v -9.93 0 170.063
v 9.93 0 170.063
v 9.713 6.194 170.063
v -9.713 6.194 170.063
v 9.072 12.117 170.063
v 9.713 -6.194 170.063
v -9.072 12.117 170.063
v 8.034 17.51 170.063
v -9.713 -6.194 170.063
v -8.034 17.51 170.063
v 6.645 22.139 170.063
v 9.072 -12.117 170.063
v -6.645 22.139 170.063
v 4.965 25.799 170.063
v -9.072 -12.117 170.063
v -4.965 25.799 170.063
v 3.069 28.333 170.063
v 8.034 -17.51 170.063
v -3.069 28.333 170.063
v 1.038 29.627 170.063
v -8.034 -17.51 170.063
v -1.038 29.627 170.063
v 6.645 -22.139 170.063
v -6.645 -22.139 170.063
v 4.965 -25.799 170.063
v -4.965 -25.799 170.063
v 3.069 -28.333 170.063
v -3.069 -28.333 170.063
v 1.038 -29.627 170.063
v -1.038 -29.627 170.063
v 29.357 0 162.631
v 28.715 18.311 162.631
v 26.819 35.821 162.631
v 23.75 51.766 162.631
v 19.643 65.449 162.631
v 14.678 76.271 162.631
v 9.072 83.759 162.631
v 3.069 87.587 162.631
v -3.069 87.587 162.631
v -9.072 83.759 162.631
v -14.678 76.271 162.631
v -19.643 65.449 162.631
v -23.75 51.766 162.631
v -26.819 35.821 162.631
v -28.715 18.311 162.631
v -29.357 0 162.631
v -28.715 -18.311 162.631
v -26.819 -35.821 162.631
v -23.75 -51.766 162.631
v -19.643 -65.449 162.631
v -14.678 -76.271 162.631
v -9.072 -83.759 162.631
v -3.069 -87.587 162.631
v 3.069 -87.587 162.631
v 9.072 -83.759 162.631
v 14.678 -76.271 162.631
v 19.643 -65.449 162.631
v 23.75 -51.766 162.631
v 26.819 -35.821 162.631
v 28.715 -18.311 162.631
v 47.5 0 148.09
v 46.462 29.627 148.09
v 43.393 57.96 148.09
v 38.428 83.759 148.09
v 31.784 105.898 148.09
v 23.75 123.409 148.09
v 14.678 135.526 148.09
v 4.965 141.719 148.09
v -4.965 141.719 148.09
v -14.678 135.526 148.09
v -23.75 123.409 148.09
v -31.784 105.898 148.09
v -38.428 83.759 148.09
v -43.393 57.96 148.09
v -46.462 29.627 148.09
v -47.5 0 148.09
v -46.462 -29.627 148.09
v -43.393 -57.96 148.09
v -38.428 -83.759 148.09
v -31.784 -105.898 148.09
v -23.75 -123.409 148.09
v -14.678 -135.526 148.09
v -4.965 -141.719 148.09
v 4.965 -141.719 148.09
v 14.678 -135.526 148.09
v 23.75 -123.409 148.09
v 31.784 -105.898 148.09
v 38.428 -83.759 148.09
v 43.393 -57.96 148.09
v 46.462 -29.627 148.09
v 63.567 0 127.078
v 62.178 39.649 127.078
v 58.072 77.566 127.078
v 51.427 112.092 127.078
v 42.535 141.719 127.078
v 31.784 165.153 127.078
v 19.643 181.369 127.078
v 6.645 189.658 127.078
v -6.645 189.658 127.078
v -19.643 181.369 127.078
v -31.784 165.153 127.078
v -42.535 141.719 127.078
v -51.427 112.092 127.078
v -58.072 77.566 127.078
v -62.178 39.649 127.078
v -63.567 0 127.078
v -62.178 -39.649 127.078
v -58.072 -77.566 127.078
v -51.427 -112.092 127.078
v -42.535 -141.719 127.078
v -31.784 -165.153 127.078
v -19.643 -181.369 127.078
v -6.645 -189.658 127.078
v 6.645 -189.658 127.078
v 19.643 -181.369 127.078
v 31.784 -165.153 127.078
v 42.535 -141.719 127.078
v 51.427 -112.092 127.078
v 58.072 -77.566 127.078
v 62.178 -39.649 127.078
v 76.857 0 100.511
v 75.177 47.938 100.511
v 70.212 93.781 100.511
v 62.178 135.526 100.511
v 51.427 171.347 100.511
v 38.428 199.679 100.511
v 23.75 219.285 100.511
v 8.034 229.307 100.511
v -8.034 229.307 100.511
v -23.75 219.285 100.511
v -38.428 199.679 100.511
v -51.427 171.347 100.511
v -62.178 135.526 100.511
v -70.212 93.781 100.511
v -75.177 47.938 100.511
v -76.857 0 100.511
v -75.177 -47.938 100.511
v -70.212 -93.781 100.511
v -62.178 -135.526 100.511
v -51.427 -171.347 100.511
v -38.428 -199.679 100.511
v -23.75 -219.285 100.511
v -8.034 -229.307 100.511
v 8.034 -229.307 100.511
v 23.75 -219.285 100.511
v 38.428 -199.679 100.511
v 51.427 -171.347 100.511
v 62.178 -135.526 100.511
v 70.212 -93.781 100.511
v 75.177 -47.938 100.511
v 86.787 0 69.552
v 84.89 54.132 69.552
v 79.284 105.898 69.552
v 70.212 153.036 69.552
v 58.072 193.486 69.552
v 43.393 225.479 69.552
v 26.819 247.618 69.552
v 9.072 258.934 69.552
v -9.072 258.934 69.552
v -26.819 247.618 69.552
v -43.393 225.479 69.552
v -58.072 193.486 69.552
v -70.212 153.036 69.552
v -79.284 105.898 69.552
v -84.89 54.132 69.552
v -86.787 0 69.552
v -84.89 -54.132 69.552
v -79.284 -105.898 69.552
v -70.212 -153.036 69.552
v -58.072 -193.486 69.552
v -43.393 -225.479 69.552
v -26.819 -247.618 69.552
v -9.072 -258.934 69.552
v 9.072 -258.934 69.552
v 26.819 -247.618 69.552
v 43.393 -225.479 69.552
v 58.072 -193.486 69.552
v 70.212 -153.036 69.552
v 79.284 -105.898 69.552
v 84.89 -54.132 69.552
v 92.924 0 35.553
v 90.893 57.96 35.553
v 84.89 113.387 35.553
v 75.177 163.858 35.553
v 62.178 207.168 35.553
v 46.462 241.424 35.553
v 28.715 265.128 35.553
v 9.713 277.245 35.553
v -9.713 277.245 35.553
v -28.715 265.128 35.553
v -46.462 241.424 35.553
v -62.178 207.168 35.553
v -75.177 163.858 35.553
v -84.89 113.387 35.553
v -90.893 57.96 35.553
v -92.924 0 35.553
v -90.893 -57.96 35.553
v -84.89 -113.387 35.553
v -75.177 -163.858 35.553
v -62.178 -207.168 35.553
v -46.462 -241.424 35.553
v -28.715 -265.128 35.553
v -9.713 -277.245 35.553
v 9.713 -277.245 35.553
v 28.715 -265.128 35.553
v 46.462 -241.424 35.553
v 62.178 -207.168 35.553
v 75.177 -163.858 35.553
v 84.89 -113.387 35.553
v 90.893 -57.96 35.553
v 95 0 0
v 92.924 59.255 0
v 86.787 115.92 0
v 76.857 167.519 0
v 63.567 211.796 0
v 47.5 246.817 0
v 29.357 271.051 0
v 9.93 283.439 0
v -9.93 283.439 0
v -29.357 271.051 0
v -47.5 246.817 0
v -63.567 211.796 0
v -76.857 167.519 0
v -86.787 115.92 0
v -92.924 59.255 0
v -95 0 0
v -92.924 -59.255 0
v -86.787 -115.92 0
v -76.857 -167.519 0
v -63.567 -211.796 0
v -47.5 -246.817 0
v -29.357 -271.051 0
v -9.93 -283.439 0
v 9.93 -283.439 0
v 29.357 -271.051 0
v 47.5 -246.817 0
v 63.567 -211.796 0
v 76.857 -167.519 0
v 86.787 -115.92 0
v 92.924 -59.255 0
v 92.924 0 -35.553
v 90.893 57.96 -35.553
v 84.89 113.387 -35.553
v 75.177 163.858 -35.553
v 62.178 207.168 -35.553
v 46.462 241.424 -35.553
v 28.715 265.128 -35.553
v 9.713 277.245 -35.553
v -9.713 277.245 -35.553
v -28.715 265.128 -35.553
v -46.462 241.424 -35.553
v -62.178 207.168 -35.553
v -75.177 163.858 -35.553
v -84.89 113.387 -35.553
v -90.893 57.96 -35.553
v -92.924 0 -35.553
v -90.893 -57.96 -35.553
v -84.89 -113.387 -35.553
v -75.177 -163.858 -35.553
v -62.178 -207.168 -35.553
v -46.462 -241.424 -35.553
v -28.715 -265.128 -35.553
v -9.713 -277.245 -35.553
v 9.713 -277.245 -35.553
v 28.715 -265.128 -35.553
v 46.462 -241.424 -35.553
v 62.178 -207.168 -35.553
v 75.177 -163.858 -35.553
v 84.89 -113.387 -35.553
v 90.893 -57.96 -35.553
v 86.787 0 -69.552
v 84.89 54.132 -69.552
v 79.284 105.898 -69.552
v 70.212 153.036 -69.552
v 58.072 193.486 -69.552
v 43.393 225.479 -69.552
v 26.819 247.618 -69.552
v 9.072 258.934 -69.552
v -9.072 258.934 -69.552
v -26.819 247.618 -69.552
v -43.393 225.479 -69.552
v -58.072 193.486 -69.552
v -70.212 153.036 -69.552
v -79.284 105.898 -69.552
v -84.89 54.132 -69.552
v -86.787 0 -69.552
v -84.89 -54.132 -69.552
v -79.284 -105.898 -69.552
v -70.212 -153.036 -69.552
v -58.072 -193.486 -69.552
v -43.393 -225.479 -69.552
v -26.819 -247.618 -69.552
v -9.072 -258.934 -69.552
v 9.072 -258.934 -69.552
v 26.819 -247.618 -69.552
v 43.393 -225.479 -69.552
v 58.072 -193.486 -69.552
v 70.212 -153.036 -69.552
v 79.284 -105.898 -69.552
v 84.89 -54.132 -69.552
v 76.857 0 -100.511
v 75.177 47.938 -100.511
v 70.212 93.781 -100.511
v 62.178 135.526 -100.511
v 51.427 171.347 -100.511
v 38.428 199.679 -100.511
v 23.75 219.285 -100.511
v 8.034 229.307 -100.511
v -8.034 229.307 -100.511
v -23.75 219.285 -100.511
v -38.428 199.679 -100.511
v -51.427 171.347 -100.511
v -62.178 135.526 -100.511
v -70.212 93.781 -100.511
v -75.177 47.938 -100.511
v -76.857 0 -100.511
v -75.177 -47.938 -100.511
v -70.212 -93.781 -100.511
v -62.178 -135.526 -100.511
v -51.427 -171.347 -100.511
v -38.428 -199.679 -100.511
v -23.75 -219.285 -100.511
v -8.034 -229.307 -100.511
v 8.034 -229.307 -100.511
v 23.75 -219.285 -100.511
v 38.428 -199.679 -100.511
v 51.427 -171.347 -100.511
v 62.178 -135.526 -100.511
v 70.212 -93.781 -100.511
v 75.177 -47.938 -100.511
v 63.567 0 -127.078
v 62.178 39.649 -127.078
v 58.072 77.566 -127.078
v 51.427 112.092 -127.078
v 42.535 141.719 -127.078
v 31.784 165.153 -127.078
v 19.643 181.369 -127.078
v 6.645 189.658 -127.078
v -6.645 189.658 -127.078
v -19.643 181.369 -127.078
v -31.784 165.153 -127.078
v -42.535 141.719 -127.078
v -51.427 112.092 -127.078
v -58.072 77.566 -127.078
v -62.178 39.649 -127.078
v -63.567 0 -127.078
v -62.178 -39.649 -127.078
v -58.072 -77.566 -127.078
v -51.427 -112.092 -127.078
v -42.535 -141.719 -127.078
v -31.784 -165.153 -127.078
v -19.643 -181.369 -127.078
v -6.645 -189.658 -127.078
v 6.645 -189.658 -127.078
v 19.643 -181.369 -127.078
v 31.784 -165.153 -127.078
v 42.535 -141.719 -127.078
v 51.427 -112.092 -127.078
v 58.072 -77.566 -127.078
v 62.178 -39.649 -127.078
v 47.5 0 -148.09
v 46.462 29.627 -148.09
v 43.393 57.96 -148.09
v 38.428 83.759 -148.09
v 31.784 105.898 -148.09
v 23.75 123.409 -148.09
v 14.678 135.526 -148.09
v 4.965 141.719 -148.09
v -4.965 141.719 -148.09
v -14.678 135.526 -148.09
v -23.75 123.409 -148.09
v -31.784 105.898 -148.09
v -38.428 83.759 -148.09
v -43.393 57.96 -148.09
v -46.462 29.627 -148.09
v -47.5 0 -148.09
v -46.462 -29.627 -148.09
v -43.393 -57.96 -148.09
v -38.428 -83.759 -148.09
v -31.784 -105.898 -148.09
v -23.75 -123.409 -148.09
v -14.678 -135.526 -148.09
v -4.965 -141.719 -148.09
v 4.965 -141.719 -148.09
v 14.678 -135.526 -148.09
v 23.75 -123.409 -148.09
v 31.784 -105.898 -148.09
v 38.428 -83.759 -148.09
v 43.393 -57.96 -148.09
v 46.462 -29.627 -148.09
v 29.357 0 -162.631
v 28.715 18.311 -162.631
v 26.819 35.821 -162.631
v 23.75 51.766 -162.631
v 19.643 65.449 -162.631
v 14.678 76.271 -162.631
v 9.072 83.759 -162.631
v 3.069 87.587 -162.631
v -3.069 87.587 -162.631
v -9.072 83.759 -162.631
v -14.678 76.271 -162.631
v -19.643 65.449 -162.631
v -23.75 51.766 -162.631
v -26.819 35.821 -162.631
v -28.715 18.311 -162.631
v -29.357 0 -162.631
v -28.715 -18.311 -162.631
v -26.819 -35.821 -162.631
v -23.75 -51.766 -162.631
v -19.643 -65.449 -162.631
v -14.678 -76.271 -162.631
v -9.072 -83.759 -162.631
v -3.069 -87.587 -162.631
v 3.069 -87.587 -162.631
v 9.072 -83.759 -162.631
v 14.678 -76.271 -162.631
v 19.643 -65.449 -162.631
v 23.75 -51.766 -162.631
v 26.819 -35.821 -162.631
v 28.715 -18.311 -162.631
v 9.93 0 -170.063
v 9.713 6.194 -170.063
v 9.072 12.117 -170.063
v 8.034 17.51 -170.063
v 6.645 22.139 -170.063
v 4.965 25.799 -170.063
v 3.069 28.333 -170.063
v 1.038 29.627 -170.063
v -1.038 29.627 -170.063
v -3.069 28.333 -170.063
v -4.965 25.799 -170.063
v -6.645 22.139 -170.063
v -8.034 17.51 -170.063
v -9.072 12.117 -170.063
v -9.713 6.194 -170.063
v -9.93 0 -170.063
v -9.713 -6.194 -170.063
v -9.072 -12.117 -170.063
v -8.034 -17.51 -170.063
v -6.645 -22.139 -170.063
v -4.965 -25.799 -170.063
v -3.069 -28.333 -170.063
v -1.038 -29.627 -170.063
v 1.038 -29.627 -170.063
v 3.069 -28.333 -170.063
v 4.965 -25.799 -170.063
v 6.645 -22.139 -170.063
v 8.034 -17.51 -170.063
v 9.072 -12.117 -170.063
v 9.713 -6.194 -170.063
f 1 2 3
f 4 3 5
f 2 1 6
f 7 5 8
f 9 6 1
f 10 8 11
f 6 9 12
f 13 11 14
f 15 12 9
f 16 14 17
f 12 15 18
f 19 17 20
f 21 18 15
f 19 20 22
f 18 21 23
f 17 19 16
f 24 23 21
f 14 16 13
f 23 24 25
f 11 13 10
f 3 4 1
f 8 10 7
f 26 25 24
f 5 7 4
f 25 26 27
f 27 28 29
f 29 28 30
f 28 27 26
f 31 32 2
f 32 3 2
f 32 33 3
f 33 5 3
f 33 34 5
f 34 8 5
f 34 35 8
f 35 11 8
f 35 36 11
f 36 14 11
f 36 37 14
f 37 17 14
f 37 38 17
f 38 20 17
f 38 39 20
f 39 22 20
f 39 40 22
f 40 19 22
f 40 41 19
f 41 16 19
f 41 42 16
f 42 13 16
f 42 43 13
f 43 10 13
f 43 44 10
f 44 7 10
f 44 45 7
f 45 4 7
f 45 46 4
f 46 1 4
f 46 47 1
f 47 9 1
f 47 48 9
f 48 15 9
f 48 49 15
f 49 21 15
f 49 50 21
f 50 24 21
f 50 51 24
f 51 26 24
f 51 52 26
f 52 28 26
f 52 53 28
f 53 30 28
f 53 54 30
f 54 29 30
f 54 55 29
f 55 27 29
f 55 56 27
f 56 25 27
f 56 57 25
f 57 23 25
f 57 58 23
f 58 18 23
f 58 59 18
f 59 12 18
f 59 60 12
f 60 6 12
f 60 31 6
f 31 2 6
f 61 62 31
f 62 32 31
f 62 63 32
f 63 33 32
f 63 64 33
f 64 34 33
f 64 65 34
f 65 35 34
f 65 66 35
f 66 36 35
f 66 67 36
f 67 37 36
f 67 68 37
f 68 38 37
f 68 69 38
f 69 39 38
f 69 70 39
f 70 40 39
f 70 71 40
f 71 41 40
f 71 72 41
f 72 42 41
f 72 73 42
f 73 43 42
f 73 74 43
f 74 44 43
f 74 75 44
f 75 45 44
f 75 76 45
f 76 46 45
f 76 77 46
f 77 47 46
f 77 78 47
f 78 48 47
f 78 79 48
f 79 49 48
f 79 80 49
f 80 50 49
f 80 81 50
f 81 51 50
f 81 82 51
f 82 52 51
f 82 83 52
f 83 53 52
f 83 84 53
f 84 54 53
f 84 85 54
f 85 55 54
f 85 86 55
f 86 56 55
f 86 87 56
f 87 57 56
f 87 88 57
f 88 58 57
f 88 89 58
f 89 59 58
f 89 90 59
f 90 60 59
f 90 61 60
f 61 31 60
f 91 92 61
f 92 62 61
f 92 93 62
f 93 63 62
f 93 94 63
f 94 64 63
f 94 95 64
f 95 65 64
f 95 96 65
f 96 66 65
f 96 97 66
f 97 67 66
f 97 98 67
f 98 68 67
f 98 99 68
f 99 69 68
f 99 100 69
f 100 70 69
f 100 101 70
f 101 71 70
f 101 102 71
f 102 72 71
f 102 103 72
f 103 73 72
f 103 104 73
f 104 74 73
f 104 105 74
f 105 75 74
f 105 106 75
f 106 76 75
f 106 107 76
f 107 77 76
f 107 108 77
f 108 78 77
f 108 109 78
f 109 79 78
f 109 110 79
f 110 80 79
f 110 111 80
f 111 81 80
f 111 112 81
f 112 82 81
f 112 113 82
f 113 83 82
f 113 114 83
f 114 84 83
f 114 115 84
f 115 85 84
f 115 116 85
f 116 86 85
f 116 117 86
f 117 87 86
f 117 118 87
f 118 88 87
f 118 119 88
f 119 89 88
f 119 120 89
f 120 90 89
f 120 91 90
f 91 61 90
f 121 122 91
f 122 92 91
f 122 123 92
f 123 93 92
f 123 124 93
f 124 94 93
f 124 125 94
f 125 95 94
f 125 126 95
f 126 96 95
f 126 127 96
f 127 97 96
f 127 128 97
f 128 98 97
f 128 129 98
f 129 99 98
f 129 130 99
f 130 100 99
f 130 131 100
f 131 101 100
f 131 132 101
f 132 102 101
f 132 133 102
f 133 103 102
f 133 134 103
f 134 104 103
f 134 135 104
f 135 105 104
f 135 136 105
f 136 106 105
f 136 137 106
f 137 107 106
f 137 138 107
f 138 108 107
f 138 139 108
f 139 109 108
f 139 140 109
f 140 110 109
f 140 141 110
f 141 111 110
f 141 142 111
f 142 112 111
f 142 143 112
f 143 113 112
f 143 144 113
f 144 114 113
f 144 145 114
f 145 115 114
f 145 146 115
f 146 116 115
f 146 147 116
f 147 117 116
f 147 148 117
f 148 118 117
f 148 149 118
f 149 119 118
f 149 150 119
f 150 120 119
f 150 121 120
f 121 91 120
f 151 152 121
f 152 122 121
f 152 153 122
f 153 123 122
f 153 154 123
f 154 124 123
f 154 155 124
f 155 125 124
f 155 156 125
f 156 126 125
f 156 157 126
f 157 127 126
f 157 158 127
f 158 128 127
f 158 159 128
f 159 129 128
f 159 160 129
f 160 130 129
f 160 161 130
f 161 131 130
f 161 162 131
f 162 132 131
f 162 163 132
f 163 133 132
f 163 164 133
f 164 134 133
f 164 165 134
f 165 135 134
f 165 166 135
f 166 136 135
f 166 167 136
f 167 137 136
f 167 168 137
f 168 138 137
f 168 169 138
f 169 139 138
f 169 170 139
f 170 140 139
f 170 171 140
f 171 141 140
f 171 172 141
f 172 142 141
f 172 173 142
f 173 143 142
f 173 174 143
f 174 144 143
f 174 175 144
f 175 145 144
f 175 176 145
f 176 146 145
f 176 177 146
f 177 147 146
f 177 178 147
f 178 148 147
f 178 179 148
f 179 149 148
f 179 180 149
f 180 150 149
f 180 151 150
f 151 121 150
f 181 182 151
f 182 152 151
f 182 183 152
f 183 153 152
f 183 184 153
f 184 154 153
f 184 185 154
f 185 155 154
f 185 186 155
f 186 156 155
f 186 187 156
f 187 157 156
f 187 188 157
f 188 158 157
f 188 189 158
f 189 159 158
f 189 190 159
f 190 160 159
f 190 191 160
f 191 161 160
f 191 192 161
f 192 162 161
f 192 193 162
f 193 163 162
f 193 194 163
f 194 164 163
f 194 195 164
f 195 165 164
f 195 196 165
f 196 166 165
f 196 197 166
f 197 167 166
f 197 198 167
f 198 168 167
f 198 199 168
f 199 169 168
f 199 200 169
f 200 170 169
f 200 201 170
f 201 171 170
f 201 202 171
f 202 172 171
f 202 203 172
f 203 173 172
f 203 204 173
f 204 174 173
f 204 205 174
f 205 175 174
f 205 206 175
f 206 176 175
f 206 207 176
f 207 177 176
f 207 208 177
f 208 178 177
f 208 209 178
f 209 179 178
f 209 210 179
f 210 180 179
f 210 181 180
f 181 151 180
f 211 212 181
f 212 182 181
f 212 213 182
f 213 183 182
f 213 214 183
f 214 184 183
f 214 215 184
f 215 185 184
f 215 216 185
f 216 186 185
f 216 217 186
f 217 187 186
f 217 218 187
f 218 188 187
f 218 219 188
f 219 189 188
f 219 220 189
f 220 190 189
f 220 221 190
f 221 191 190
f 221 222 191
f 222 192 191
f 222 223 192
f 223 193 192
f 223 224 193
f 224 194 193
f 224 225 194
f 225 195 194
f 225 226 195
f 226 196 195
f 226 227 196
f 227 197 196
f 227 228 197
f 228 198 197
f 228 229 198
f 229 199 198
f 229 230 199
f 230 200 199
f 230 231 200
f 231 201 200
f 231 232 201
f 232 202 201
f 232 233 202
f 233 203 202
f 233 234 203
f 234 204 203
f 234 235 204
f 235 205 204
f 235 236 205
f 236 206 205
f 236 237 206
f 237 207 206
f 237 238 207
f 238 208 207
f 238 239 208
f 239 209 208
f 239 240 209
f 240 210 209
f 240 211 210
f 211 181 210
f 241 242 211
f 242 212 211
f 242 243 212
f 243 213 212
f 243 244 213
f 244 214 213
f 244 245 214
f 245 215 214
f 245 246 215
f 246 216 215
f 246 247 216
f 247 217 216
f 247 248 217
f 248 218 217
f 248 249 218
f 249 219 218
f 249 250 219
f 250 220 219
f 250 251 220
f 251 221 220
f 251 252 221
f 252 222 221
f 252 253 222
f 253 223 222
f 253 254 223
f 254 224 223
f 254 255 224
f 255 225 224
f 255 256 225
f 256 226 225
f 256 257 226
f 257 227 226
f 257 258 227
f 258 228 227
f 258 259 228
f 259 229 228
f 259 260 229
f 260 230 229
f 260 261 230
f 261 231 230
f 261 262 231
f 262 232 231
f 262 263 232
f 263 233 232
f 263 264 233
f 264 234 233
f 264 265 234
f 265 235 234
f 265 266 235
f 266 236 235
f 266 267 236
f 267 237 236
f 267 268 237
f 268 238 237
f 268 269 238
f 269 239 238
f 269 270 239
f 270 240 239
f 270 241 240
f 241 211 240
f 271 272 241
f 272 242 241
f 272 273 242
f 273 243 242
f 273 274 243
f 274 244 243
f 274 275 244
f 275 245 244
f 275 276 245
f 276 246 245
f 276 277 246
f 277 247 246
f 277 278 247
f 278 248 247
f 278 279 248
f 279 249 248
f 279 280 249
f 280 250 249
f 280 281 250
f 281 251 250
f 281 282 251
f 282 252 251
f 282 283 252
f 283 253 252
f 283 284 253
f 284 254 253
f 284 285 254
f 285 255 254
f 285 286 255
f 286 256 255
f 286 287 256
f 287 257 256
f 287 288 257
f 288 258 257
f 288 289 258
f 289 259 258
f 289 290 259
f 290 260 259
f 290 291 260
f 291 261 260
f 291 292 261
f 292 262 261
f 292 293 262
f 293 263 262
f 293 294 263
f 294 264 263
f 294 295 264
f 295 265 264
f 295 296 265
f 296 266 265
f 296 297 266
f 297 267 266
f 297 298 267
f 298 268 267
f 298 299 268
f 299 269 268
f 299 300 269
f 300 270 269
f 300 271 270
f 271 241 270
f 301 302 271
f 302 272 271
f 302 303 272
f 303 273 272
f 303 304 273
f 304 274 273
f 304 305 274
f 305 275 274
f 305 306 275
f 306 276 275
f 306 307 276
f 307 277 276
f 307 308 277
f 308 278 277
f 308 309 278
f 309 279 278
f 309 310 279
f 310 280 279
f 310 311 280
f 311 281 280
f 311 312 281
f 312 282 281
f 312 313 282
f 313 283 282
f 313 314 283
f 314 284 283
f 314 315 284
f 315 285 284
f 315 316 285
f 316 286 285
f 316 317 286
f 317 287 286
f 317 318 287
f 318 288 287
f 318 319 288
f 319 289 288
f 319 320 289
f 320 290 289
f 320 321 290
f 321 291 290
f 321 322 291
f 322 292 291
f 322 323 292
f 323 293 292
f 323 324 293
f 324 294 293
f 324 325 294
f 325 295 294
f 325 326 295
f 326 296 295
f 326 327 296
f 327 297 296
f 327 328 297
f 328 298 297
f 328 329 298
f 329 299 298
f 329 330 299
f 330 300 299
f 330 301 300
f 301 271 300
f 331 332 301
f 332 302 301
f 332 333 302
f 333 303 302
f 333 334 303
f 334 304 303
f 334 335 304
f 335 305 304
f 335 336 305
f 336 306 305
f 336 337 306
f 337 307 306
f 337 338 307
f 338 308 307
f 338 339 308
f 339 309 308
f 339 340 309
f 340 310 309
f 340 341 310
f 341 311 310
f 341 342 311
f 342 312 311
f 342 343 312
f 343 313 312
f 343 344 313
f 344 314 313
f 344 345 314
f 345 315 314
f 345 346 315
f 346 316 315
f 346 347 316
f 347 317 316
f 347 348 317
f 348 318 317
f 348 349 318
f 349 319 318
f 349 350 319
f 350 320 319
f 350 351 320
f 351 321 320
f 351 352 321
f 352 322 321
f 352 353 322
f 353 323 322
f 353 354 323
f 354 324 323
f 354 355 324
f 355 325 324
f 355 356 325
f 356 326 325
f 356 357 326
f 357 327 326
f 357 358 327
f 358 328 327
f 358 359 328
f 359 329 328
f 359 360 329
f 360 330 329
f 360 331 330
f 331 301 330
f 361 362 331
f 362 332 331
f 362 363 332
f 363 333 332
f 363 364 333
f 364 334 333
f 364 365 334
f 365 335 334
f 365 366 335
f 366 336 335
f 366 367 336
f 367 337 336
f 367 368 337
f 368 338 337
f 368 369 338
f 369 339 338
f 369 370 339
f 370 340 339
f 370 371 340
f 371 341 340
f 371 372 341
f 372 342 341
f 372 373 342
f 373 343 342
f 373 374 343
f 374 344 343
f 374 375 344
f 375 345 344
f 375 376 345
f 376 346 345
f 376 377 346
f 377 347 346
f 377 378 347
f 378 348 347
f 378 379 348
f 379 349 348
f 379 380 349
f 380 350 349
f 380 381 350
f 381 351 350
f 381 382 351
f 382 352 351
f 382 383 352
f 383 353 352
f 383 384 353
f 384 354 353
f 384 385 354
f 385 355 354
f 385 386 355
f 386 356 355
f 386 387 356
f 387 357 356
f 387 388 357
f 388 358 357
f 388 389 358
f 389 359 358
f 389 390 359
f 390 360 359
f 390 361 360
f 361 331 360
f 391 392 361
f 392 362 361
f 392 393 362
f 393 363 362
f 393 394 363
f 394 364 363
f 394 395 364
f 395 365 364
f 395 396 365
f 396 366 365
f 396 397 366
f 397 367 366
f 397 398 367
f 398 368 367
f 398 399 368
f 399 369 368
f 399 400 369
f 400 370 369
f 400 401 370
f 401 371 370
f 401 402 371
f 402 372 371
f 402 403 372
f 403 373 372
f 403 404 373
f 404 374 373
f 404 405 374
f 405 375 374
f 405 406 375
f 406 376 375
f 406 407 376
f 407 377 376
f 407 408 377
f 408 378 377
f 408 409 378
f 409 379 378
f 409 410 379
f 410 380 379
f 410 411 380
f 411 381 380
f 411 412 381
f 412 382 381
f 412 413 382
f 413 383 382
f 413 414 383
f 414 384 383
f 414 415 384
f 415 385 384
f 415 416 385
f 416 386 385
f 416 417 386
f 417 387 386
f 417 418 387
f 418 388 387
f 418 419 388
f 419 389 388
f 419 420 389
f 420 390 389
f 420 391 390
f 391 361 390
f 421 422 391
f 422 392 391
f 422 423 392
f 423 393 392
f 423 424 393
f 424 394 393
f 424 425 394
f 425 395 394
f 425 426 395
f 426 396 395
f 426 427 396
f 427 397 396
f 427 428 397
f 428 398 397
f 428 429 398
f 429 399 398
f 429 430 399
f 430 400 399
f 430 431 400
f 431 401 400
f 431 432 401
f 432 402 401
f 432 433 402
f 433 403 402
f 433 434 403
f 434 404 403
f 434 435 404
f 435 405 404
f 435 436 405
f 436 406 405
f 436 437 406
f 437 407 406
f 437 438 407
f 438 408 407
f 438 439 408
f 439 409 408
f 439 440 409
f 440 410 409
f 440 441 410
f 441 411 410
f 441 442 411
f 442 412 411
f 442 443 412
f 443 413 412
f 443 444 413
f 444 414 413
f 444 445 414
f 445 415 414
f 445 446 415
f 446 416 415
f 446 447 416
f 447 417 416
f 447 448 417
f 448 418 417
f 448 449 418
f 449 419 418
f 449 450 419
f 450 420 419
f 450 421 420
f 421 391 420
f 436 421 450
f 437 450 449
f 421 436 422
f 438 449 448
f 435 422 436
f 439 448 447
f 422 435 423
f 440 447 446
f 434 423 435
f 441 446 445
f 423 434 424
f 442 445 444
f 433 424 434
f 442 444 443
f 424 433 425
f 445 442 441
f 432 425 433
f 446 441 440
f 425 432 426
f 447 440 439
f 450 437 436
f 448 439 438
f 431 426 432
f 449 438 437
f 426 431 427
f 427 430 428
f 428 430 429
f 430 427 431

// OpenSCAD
// Generated by SolidPython 1.0.1 on 2020-07-29 00:46:46


scale(v = [5, 15, 9]) {
	sphere(r = 19);
}
/***********************************************
*********      SolidPython code:      **********
************************************************
 
# import packages: SolidPython
from solid import *
from solid.utils import *
from itertools import chain, combinations, permutations


class Resize:

    def __init__(self, scad_file):
        self.scad_file = scad_file
        #self.scad_file = import_scad(scad_file)
        # cone/cylinder param:
        self.r1 = 0
        self.r2 = 0
        self.h = 0
        # rectangular prism param:
        self.w = 0
        self.l = 0
        # ellipse param:
        self.r = 0

    # import OpenScad code (file name corresponds to shape)


    # classify shape + parameters
    def assign(self, param1, param2, param3):
        if self.scad_file == 'cone.scad':
            self.r1 = param1
            self.r2 = param2
            self.h = param3
        elif self.scad_file == 'cylinder.scad':
            self.r1 = param1
            self.r2 = param2
            self.h = param3
        elif self.scad_file == 'rectangularPrism.scad':
            self.h = param1
            self.l = param2
            self.w = param3
        else:
            self.r = param1
            self.h = param2

    # resize parameters
    def iterate(self):
        x = range(3, 20, 2)
        i = 1
        if self.scad_file == 'cone.scad':
            tempList = list(permutations(x, 2))
            for temp in tempList:
                param1 = temp[0]
                param2 = temp[1]
                filepath = 'produced_scad_files/' + 'cone' + str(param1) + '_' + str(param2) + '_' + '.scad'
                scad_render_to_file(cylinder(h=param1, r1=param2, r2=0), filepath)

        elif self.scad_file == 'cylinder.scad':
            tempList = list(permutations(x, 3))
            for temp in tempList:
                param1 = temp[0]
                param2 = temp[1]
                filepath = 'produced_scad_files/' + 'cylinder' + str(param1) + '_' + str(param2) + '_' + '.scad'
                scad_render_to_file(cylinder(h=param1, r1=param2, r2=param2), filepath)

        elif self.scad_file == 'rectangularPrism.scad':
            tempList = list(permutations(x, 3))
            for temp in tempList:
                param1 = temp[0]
                param2 = temp[1]
                param3 = temp[2]
                filepath = 'produced_scad_files/' + 'rectangularPrism' + str(param1) + '_' + str(param2) + '_' + str(
                    param3) + '.scad'
                scad_render_to_file(cube(size=(param1, param2, param3)), filepath)

        elif self.scad_file == 'ellipse.scad':
            tempList = list(permutations(x, 4))
            for temp in tempList:
                param1 = temp[0]
                param2 = temp[1]
                param3 = temp[2]
                param4 = temp[3]
                filepath = 'produced_scad_files/' + 'ellipse' + str(param1) + '_' + str(param2) + '_' + str(param3) + '_' + str(param4) + '.scad'
                scad_render_to_file(scale([param1, param2, param3])(sphere(r=param4)), filepath)

    def render_to_scadfile(self):
        scad_render_to_file(scad, 'example.scad') 
 
************************************************/
